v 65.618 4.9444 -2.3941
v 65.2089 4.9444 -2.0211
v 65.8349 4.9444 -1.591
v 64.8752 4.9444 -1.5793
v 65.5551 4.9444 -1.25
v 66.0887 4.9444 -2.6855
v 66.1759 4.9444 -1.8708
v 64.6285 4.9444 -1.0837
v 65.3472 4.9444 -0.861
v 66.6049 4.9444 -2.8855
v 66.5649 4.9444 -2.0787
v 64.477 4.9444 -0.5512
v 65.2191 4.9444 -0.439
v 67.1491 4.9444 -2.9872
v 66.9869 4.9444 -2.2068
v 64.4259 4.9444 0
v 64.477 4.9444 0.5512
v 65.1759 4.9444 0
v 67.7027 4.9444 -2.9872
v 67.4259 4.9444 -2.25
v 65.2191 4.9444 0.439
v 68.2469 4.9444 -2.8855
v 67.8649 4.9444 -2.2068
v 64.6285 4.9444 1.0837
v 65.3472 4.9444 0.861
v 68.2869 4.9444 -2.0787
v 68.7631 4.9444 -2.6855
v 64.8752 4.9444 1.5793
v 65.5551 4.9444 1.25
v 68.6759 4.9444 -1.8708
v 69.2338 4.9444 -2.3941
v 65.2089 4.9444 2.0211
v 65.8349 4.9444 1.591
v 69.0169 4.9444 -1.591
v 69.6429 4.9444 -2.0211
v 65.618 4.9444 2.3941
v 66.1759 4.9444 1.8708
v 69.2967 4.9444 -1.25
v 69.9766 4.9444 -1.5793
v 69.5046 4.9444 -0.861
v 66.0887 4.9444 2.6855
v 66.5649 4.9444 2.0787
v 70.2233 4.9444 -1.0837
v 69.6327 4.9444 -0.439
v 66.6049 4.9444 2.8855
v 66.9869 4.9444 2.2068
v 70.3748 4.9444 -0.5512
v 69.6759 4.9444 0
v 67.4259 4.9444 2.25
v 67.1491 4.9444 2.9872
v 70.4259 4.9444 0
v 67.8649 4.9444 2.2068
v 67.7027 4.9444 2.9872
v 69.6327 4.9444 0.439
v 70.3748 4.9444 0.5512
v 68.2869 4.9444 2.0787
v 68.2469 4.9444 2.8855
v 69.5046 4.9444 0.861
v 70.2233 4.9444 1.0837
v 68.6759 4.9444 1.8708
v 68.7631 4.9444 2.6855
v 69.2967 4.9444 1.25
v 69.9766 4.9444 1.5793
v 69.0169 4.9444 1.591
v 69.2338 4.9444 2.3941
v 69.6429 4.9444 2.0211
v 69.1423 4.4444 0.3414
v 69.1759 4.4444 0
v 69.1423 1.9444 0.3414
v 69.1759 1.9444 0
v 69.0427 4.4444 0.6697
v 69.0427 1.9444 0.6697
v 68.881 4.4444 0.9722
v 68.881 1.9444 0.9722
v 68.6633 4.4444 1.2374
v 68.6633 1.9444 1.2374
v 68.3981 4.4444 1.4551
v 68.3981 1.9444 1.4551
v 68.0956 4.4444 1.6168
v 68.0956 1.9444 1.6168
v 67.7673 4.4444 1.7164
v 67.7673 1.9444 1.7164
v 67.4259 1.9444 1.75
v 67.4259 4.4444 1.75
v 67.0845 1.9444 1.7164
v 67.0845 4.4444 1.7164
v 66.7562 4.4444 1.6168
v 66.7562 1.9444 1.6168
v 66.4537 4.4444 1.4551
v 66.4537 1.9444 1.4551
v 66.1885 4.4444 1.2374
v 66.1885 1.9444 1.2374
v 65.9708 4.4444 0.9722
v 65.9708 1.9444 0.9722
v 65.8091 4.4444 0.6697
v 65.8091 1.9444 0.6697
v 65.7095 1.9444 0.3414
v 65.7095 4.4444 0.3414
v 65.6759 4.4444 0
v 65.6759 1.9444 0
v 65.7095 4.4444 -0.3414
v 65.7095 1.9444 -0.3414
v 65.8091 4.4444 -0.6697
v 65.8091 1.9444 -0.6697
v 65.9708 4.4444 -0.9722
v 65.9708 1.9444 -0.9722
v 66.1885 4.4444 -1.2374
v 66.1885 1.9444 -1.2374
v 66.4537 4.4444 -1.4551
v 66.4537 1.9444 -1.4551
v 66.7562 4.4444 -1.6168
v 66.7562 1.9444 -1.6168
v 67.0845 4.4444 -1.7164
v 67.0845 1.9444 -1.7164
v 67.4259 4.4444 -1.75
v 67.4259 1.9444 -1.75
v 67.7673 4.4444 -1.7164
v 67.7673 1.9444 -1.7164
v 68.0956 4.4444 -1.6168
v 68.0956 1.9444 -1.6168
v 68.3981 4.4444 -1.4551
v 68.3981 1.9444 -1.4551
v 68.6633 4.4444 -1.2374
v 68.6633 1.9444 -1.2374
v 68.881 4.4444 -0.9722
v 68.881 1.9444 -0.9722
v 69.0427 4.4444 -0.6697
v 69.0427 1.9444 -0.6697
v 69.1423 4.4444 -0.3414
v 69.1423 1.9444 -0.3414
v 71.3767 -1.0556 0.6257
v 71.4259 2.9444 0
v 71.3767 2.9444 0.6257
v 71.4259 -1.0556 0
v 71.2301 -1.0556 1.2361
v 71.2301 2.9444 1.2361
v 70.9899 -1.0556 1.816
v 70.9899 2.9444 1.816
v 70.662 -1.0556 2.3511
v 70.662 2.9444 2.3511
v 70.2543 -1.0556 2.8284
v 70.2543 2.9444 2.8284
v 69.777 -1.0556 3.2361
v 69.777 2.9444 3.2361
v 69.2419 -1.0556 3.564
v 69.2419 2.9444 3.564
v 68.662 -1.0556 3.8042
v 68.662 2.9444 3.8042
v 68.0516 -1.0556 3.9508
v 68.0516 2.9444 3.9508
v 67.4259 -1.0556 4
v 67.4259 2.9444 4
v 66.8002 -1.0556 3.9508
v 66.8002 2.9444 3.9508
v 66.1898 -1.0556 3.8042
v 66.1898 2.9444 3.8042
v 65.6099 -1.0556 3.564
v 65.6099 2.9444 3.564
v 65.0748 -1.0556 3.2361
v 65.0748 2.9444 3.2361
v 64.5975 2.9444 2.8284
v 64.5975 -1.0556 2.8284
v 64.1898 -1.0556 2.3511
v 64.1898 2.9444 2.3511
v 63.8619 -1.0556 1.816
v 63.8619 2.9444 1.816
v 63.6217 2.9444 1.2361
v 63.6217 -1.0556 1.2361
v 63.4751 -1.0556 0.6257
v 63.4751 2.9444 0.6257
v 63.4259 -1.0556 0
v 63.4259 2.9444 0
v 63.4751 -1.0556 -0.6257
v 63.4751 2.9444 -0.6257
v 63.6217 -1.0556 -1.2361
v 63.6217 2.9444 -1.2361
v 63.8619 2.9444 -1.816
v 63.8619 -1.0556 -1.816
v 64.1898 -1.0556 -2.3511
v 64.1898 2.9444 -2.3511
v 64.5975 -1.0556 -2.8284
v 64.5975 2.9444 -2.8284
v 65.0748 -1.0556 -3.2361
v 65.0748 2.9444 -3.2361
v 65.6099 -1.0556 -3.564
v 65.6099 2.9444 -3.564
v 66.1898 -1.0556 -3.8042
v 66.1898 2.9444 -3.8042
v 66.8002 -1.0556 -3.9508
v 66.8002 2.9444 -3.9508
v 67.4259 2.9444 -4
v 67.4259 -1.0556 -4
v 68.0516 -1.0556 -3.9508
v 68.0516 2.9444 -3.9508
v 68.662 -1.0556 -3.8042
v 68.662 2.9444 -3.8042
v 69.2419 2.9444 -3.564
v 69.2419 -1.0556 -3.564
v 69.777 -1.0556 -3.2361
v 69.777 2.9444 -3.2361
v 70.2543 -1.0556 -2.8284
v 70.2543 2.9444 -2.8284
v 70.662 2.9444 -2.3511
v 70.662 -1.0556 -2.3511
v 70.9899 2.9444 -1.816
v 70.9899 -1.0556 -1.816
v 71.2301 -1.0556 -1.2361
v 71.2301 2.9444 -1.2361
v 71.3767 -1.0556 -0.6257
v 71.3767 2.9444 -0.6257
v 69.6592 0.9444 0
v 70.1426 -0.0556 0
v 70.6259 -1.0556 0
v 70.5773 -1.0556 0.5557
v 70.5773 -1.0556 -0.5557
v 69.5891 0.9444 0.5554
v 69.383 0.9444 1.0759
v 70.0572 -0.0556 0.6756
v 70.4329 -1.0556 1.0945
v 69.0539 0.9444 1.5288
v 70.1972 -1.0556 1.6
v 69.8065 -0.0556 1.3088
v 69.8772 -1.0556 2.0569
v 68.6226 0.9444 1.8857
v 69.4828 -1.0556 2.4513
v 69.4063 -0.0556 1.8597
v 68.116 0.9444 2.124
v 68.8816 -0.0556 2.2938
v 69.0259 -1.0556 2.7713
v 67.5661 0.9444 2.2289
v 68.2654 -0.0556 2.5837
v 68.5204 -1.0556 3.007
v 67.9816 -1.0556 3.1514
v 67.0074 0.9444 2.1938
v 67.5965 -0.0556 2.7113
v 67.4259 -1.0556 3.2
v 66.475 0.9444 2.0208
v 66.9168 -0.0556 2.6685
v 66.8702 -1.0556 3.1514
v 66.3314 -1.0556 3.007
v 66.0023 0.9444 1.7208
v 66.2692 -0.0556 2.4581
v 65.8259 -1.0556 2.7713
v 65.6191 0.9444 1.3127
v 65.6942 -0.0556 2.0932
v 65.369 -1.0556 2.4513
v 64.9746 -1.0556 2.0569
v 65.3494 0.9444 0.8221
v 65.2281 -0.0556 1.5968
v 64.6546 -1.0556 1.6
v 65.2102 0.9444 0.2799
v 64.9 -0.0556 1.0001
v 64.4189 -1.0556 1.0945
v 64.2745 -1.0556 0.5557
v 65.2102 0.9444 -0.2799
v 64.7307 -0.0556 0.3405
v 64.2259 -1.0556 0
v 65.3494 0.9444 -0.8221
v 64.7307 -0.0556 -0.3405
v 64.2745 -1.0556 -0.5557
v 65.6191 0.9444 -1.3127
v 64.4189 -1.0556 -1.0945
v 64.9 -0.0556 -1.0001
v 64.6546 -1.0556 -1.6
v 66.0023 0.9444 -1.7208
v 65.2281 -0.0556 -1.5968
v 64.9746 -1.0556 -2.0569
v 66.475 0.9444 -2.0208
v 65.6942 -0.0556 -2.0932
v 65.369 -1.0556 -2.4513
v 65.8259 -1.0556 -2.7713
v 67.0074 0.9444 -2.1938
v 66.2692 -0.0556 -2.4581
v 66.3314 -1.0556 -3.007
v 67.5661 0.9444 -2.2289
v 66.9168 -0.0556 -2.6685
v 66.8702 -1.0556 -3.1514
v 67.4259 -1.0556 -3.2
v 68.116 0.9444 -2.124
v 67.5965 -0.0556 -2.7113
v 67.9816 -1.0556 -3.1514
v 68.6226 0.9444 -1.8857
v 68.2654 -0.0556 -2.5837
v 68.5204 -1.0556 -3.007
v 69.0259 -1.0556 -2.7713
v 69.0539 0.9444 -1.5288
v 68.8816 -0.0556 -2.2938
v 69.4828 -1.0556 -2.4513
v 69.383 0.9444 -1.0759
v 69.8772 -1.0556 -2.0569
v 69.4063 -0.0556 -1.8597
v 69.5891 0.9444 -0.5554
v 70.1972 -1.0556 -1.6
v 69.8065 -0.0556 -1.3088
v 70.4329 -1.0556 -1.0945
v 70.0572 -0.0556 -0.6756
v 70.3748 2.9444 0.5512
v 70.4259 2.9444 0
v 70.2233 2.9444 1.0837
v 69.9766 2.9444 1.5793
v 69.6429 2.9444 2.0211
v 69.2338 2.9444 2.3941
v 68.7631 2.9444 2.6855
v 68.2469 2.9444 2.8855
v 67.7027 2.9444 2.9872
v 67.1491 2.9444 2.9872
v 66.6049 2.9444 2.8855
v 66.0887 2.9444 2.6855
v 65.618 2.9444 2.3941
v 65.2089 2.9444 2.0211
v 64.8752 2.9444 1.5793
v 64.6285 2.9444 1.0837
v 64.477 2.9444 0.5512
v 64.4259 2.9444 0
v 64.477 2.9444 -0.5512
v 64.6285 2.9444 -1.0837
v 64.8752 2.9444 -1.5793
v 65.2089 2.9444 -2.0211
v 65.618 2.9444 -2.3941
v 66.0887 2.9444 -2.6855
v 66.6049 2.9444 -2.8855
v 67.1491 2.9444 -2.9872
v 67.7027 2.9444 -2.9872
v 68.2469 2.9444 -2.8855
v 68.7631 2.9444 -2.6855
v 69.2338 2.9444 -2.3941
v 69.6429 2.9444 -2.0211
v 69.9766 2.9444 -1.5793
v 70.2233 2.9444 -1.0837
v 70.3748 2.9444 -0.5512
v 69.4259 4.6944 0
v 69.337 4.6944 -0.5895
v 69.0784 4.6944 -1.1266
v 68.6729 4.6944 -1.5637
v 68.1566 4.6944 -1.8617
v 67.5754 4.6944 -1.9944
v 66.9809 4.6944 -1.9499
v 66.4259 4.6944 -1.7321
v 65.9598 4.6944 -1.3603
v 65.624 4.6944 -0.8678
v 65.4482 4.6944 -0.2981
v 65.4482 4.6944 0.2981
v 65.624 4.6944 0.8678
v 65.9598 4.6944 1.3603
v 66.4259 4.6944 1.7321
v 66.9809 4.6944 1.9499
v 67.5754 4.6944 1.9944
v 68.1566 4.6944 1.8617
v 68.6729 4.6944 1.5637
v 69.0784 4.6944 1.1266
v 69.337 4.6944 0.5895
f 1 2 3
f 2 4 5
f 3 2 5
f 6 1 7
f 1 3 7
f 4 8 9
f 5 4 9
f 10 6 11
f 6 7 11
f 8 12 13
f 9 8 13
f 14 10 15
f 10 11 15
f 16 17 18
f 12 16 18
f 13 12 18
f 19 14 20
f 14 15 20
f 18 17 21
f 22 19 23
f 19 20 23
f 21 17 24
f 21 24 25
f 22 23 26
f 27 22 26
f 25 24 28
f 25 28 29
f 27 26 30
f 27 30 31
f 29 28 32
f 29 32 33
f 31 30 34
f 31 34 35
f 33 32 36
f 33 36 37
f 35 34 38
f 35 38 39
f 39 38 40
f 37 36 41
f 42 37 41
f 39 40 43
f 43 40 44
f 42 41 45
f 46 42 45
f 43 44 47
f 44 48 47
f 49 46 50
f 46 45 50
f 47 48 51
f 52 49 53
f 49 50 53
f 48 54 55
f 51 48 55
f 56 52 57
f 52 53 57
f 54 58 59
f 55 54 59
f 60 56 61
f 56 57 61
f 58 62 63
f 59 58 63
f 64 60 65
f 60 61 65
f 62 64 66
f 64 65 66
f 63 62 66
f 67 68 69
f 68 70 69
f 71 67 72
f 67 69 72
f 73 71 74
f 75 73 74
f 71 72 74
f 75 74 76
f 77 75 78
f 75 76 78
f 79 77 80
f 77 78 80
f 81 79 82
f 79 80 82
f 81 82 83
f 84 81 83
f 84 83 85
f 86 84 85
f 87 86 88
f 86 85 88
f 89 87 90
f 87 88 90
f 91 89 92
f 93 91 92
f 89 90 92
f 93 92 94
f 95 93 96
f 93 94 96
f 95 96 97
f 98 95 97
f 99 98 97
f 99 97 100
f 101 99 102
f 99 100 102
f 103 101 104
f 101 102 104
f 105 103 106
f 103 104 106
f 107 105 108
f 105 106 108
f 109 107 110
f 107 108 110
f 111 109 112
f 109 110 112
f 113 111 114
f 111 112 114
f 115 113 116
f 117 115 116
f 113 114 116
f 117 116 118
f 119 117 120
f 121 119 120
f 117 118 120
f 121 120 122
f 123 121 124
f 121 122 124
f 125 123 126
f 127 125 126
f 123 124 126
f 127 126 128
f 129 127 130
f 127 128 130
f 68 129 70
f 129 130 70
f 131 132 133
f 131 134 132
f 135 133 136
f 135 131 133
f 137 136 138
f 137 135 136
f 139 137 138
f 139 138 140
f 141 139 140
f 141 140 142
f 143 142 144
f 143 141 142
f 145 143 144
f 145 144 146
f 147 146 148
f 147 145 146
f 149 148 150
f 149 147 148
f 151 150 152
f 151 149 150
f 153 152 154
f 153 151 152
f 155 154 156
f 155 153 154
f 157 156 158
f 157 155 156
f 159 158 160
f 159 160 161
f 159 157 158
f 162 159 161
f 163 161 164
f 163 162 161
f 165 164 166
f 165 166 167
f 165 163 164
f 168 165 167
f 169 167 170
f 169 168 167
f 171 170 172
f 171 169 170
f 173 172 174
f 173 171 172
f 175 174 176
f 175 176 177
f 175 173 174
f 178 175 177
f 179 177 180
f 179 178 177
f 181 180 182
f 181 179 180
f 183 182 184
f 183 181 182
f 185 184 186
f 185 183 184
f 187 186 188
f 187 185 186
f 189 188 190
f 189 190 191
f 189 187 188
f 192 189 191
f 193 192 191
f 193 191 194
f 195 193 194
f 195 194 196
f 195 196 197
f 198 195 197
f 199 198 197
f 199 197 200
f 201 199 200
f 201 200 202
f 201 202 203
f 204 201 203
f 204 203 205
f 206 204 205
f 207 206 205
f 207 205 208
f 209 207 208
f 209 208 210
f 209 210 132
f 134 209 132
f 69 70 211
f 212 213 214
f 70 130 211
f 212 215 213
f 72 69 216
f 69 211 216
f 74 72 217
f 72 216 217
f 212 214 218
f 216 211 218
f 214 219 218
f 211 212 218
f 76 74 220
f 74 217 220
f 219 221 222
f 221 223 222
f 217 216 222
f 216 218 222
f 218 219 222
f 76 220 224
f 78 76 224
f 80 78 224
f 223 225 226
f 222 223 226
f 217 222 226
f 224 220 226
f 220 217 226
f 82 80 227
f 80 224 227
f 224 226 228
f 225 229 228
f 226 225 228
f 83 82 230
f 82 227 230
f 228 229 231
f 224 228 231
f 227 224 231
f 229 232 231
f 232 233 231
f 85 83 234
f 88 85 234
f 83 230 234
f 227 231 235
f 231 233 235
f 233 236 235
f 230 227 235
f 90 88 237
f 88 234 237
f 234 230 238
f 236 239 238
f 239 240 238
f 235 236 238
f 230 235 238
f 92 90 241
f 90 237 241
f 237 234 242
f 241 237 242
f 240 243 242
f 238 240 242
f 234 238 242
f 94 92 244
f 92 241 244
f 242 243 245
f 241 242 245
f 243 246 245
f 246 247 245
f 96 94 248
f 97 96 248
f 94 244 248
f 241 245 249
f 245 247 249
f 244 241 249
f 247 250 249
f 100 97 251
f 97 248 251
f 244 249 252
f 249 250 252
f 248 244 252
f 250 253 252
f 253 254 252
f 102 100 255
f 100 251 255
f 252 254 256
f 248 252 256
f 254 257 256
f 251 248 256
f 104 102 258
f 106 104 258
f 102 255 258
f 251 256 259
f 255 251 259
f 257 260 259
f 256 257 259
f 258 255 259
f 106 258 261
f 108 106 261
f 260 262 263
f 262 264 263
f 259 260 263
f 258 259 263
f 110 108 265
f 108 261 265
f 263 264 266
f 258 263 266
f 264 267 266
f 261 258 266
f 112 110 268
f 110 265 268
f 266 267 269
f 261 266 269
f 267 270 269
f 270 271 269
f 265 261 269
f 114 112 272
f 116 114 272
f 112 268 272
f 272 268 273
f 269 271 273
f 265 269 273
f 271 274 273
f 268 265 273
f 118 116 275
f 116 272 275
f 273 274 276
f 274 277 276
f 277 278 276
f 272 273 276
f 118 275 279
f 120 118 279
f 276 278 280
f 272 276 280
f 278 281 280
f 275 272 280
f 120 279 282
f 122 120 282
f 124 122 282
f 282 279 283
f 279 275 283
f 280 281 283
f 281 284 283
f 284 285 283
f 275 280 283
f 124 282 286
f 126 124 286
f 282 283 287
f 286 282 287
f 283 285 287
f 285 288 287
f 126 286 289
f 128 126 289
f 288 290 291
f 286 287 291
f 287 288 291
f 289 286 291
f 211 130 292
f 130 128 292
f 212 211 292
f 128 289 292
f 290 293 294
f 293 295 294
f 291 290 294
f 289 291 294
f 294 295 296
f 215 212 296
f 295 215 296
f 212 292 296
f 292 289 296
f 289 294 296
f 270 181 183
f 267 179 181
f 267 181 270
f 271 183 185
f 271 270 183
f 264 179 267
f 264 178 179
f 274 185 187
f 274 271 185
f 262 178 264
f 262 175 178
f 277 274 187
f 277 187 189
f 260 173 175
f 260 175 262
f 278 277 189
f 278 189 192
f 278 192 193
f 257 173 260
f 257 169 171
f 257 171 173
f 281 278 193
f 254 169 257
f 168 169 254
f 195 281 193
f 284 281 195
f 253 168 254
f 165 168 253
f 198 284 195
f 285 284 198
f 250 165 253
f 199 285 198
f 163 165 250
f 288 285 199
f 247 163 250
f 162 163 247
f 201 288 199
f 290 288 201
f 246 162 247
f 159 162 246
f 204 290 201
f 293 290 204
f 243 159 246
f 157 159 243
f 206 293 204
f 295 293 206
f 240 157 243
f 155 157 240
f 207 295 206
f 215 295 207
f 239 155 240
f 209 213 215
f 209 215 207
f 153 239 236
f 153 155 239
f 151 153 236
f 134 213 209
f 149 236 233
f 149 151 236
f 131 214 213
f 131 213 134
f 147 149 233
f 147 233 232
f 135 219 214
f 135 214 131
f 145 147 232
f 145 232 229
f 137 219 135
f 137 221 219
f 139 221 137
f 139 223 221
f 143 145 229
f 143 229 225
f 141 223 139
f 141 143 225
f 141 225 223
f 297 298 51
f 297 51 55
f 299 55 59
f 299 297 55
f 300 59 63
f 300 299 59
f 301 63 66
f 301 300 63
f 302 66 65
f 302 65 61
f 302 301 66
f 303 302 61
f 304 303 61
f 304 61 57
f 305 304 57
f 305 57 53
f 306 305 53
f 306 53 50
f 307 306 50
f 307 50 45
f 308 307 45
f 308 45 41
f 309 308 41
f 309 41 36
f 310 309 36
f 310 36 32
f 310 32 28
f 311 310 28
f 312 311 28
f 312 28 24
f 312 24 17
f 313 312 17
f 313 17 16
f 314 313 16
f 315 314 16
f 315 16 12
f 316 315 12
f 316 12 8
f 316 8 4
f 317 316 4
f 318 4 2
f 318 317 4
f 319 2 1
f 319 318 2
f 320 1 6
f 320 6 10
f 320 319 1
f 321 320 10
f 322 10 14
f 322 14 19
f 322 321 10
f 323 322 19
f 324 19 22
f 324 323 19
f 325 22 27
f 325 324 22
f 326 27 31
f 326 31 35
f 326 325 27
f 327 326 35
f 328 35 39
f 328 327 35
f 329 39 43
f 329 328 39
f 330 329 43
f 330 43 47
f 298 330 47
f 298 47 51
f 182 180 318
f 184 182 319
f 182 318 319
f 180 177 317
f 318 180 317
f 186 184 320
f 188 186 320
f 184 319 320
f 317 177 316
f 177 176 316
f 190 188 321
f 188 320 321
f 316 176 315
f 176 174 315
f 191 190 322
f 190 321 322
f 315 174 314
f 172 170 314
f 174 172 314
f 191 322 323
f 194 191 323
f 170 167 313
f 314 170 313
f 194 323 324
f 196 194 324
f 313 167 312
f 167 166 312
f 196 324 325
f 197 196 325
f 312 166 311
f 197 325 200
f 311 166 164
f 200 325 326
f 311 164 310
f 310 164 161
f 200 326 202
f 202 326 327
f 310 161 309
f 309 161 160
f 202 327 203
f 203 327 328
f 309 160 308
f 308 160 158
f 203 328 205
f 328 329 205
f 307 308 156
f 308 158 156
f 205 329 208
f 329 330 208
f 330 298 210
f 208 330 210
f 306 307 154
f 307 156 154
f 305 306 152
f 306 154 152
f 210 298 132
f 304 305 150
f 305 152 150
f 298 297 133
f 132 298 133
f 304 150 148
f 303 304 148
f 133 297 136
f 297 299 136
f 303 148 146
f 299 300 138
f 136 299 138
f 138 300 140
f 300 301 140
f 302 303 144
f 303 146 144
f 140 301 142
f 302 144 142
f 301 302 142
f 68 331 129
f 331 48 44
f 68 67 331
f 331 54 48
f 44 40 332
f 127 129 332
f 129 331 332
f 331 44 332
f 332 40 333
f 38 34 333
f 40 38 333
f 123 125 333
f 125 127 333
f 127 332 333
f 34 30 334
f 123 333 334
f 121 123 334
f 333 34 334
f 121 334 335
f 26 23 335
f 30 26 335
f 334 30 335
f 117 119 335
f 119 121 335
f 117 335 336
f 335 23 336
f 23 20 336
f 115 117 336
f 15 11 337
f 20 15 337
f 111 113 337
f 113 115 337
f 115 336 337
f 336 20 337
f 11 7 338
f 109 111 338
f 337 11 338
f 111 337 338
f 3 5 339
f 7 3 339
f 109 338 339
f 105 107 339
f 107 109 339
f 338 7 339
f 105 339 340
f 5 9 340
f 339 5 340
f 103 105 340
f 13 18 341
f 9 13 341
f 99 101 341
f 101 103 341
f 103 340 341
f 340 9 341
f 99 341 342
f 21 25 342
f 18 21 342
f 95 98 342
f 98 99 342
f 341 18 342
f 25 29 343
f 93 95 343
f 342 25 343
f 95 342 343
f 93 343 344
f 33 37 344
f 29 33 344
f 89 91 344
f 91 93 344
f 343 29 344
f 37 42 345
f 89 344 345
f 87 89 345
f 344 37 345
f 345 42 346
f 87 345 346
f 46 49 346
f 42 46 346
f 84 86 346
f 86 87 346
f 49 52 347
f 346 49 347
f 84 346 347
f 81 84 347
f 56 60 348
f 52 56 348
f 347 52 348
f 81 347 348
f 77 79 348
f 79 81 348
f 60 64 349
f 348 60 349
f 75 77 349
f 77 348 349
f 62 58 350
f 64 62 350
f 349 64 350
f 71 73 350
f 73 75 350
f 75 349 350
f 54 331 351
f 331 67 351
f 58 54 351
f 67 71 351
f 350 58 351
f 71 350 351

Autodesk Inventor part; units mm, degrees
ref_plane "YZ Plane" through (0, 0, 0) normal (1, 0, 0) x (0, 1, 0)
ref_plane "XZ Plane" through (0, 0, 0) normal (0, 1, 0) x (-1, 0, 0)
ref_plane "XY Plane" through (0, 0, 0) normal (0, 0, 1) x (1, 0, 0)
sketch "Эскиз1" plane through (0, 0, 0) normal (0, 0, 1) x (1, 0, 0)
  line L0 (69.1759, 4.9444) -> (70.4259, 4.9444)
  line L1 (70.4259, 4.9444) -> (70.4259, 2.9444)
  line L2 (67.4259, 4.9444) -> (67.4259, 0)
  line L3 (69.1759, 4.9444) -> (69.1759, 1.9444)
  line L4 (70.4259, 2.9444) -> (71.4259, 2.9444)
  line L5 (71.4259, 2.9444) -> (71.4259, -1.0556)
  line L6 (71.4259, -1.0556) -> (70.6259, -1.0556)
  line L7 (70.6259, -1.0556) -> (69.1759, 1.9444)
  point P0 (0, 0)
  dimension "d0" = 6
  dimension "d1" = 8
  dimension "d2" = 2
  dimension "d3" = 4
  dimension "d4" = 3
  dimension "d5" = 0.8
  dimension "d6" = 3.5
revolve "Вращение1" add sketch "Эскиз1" angle 360 about axis through (67.4259, 4.9444, 0) along (0, -1, 0)
chamfer "Фаска1" distance 0.5 angle 45 1 edges at (65.6759, 4.9444, 0)
properties part number "nut" material "Сталь, литейная"
